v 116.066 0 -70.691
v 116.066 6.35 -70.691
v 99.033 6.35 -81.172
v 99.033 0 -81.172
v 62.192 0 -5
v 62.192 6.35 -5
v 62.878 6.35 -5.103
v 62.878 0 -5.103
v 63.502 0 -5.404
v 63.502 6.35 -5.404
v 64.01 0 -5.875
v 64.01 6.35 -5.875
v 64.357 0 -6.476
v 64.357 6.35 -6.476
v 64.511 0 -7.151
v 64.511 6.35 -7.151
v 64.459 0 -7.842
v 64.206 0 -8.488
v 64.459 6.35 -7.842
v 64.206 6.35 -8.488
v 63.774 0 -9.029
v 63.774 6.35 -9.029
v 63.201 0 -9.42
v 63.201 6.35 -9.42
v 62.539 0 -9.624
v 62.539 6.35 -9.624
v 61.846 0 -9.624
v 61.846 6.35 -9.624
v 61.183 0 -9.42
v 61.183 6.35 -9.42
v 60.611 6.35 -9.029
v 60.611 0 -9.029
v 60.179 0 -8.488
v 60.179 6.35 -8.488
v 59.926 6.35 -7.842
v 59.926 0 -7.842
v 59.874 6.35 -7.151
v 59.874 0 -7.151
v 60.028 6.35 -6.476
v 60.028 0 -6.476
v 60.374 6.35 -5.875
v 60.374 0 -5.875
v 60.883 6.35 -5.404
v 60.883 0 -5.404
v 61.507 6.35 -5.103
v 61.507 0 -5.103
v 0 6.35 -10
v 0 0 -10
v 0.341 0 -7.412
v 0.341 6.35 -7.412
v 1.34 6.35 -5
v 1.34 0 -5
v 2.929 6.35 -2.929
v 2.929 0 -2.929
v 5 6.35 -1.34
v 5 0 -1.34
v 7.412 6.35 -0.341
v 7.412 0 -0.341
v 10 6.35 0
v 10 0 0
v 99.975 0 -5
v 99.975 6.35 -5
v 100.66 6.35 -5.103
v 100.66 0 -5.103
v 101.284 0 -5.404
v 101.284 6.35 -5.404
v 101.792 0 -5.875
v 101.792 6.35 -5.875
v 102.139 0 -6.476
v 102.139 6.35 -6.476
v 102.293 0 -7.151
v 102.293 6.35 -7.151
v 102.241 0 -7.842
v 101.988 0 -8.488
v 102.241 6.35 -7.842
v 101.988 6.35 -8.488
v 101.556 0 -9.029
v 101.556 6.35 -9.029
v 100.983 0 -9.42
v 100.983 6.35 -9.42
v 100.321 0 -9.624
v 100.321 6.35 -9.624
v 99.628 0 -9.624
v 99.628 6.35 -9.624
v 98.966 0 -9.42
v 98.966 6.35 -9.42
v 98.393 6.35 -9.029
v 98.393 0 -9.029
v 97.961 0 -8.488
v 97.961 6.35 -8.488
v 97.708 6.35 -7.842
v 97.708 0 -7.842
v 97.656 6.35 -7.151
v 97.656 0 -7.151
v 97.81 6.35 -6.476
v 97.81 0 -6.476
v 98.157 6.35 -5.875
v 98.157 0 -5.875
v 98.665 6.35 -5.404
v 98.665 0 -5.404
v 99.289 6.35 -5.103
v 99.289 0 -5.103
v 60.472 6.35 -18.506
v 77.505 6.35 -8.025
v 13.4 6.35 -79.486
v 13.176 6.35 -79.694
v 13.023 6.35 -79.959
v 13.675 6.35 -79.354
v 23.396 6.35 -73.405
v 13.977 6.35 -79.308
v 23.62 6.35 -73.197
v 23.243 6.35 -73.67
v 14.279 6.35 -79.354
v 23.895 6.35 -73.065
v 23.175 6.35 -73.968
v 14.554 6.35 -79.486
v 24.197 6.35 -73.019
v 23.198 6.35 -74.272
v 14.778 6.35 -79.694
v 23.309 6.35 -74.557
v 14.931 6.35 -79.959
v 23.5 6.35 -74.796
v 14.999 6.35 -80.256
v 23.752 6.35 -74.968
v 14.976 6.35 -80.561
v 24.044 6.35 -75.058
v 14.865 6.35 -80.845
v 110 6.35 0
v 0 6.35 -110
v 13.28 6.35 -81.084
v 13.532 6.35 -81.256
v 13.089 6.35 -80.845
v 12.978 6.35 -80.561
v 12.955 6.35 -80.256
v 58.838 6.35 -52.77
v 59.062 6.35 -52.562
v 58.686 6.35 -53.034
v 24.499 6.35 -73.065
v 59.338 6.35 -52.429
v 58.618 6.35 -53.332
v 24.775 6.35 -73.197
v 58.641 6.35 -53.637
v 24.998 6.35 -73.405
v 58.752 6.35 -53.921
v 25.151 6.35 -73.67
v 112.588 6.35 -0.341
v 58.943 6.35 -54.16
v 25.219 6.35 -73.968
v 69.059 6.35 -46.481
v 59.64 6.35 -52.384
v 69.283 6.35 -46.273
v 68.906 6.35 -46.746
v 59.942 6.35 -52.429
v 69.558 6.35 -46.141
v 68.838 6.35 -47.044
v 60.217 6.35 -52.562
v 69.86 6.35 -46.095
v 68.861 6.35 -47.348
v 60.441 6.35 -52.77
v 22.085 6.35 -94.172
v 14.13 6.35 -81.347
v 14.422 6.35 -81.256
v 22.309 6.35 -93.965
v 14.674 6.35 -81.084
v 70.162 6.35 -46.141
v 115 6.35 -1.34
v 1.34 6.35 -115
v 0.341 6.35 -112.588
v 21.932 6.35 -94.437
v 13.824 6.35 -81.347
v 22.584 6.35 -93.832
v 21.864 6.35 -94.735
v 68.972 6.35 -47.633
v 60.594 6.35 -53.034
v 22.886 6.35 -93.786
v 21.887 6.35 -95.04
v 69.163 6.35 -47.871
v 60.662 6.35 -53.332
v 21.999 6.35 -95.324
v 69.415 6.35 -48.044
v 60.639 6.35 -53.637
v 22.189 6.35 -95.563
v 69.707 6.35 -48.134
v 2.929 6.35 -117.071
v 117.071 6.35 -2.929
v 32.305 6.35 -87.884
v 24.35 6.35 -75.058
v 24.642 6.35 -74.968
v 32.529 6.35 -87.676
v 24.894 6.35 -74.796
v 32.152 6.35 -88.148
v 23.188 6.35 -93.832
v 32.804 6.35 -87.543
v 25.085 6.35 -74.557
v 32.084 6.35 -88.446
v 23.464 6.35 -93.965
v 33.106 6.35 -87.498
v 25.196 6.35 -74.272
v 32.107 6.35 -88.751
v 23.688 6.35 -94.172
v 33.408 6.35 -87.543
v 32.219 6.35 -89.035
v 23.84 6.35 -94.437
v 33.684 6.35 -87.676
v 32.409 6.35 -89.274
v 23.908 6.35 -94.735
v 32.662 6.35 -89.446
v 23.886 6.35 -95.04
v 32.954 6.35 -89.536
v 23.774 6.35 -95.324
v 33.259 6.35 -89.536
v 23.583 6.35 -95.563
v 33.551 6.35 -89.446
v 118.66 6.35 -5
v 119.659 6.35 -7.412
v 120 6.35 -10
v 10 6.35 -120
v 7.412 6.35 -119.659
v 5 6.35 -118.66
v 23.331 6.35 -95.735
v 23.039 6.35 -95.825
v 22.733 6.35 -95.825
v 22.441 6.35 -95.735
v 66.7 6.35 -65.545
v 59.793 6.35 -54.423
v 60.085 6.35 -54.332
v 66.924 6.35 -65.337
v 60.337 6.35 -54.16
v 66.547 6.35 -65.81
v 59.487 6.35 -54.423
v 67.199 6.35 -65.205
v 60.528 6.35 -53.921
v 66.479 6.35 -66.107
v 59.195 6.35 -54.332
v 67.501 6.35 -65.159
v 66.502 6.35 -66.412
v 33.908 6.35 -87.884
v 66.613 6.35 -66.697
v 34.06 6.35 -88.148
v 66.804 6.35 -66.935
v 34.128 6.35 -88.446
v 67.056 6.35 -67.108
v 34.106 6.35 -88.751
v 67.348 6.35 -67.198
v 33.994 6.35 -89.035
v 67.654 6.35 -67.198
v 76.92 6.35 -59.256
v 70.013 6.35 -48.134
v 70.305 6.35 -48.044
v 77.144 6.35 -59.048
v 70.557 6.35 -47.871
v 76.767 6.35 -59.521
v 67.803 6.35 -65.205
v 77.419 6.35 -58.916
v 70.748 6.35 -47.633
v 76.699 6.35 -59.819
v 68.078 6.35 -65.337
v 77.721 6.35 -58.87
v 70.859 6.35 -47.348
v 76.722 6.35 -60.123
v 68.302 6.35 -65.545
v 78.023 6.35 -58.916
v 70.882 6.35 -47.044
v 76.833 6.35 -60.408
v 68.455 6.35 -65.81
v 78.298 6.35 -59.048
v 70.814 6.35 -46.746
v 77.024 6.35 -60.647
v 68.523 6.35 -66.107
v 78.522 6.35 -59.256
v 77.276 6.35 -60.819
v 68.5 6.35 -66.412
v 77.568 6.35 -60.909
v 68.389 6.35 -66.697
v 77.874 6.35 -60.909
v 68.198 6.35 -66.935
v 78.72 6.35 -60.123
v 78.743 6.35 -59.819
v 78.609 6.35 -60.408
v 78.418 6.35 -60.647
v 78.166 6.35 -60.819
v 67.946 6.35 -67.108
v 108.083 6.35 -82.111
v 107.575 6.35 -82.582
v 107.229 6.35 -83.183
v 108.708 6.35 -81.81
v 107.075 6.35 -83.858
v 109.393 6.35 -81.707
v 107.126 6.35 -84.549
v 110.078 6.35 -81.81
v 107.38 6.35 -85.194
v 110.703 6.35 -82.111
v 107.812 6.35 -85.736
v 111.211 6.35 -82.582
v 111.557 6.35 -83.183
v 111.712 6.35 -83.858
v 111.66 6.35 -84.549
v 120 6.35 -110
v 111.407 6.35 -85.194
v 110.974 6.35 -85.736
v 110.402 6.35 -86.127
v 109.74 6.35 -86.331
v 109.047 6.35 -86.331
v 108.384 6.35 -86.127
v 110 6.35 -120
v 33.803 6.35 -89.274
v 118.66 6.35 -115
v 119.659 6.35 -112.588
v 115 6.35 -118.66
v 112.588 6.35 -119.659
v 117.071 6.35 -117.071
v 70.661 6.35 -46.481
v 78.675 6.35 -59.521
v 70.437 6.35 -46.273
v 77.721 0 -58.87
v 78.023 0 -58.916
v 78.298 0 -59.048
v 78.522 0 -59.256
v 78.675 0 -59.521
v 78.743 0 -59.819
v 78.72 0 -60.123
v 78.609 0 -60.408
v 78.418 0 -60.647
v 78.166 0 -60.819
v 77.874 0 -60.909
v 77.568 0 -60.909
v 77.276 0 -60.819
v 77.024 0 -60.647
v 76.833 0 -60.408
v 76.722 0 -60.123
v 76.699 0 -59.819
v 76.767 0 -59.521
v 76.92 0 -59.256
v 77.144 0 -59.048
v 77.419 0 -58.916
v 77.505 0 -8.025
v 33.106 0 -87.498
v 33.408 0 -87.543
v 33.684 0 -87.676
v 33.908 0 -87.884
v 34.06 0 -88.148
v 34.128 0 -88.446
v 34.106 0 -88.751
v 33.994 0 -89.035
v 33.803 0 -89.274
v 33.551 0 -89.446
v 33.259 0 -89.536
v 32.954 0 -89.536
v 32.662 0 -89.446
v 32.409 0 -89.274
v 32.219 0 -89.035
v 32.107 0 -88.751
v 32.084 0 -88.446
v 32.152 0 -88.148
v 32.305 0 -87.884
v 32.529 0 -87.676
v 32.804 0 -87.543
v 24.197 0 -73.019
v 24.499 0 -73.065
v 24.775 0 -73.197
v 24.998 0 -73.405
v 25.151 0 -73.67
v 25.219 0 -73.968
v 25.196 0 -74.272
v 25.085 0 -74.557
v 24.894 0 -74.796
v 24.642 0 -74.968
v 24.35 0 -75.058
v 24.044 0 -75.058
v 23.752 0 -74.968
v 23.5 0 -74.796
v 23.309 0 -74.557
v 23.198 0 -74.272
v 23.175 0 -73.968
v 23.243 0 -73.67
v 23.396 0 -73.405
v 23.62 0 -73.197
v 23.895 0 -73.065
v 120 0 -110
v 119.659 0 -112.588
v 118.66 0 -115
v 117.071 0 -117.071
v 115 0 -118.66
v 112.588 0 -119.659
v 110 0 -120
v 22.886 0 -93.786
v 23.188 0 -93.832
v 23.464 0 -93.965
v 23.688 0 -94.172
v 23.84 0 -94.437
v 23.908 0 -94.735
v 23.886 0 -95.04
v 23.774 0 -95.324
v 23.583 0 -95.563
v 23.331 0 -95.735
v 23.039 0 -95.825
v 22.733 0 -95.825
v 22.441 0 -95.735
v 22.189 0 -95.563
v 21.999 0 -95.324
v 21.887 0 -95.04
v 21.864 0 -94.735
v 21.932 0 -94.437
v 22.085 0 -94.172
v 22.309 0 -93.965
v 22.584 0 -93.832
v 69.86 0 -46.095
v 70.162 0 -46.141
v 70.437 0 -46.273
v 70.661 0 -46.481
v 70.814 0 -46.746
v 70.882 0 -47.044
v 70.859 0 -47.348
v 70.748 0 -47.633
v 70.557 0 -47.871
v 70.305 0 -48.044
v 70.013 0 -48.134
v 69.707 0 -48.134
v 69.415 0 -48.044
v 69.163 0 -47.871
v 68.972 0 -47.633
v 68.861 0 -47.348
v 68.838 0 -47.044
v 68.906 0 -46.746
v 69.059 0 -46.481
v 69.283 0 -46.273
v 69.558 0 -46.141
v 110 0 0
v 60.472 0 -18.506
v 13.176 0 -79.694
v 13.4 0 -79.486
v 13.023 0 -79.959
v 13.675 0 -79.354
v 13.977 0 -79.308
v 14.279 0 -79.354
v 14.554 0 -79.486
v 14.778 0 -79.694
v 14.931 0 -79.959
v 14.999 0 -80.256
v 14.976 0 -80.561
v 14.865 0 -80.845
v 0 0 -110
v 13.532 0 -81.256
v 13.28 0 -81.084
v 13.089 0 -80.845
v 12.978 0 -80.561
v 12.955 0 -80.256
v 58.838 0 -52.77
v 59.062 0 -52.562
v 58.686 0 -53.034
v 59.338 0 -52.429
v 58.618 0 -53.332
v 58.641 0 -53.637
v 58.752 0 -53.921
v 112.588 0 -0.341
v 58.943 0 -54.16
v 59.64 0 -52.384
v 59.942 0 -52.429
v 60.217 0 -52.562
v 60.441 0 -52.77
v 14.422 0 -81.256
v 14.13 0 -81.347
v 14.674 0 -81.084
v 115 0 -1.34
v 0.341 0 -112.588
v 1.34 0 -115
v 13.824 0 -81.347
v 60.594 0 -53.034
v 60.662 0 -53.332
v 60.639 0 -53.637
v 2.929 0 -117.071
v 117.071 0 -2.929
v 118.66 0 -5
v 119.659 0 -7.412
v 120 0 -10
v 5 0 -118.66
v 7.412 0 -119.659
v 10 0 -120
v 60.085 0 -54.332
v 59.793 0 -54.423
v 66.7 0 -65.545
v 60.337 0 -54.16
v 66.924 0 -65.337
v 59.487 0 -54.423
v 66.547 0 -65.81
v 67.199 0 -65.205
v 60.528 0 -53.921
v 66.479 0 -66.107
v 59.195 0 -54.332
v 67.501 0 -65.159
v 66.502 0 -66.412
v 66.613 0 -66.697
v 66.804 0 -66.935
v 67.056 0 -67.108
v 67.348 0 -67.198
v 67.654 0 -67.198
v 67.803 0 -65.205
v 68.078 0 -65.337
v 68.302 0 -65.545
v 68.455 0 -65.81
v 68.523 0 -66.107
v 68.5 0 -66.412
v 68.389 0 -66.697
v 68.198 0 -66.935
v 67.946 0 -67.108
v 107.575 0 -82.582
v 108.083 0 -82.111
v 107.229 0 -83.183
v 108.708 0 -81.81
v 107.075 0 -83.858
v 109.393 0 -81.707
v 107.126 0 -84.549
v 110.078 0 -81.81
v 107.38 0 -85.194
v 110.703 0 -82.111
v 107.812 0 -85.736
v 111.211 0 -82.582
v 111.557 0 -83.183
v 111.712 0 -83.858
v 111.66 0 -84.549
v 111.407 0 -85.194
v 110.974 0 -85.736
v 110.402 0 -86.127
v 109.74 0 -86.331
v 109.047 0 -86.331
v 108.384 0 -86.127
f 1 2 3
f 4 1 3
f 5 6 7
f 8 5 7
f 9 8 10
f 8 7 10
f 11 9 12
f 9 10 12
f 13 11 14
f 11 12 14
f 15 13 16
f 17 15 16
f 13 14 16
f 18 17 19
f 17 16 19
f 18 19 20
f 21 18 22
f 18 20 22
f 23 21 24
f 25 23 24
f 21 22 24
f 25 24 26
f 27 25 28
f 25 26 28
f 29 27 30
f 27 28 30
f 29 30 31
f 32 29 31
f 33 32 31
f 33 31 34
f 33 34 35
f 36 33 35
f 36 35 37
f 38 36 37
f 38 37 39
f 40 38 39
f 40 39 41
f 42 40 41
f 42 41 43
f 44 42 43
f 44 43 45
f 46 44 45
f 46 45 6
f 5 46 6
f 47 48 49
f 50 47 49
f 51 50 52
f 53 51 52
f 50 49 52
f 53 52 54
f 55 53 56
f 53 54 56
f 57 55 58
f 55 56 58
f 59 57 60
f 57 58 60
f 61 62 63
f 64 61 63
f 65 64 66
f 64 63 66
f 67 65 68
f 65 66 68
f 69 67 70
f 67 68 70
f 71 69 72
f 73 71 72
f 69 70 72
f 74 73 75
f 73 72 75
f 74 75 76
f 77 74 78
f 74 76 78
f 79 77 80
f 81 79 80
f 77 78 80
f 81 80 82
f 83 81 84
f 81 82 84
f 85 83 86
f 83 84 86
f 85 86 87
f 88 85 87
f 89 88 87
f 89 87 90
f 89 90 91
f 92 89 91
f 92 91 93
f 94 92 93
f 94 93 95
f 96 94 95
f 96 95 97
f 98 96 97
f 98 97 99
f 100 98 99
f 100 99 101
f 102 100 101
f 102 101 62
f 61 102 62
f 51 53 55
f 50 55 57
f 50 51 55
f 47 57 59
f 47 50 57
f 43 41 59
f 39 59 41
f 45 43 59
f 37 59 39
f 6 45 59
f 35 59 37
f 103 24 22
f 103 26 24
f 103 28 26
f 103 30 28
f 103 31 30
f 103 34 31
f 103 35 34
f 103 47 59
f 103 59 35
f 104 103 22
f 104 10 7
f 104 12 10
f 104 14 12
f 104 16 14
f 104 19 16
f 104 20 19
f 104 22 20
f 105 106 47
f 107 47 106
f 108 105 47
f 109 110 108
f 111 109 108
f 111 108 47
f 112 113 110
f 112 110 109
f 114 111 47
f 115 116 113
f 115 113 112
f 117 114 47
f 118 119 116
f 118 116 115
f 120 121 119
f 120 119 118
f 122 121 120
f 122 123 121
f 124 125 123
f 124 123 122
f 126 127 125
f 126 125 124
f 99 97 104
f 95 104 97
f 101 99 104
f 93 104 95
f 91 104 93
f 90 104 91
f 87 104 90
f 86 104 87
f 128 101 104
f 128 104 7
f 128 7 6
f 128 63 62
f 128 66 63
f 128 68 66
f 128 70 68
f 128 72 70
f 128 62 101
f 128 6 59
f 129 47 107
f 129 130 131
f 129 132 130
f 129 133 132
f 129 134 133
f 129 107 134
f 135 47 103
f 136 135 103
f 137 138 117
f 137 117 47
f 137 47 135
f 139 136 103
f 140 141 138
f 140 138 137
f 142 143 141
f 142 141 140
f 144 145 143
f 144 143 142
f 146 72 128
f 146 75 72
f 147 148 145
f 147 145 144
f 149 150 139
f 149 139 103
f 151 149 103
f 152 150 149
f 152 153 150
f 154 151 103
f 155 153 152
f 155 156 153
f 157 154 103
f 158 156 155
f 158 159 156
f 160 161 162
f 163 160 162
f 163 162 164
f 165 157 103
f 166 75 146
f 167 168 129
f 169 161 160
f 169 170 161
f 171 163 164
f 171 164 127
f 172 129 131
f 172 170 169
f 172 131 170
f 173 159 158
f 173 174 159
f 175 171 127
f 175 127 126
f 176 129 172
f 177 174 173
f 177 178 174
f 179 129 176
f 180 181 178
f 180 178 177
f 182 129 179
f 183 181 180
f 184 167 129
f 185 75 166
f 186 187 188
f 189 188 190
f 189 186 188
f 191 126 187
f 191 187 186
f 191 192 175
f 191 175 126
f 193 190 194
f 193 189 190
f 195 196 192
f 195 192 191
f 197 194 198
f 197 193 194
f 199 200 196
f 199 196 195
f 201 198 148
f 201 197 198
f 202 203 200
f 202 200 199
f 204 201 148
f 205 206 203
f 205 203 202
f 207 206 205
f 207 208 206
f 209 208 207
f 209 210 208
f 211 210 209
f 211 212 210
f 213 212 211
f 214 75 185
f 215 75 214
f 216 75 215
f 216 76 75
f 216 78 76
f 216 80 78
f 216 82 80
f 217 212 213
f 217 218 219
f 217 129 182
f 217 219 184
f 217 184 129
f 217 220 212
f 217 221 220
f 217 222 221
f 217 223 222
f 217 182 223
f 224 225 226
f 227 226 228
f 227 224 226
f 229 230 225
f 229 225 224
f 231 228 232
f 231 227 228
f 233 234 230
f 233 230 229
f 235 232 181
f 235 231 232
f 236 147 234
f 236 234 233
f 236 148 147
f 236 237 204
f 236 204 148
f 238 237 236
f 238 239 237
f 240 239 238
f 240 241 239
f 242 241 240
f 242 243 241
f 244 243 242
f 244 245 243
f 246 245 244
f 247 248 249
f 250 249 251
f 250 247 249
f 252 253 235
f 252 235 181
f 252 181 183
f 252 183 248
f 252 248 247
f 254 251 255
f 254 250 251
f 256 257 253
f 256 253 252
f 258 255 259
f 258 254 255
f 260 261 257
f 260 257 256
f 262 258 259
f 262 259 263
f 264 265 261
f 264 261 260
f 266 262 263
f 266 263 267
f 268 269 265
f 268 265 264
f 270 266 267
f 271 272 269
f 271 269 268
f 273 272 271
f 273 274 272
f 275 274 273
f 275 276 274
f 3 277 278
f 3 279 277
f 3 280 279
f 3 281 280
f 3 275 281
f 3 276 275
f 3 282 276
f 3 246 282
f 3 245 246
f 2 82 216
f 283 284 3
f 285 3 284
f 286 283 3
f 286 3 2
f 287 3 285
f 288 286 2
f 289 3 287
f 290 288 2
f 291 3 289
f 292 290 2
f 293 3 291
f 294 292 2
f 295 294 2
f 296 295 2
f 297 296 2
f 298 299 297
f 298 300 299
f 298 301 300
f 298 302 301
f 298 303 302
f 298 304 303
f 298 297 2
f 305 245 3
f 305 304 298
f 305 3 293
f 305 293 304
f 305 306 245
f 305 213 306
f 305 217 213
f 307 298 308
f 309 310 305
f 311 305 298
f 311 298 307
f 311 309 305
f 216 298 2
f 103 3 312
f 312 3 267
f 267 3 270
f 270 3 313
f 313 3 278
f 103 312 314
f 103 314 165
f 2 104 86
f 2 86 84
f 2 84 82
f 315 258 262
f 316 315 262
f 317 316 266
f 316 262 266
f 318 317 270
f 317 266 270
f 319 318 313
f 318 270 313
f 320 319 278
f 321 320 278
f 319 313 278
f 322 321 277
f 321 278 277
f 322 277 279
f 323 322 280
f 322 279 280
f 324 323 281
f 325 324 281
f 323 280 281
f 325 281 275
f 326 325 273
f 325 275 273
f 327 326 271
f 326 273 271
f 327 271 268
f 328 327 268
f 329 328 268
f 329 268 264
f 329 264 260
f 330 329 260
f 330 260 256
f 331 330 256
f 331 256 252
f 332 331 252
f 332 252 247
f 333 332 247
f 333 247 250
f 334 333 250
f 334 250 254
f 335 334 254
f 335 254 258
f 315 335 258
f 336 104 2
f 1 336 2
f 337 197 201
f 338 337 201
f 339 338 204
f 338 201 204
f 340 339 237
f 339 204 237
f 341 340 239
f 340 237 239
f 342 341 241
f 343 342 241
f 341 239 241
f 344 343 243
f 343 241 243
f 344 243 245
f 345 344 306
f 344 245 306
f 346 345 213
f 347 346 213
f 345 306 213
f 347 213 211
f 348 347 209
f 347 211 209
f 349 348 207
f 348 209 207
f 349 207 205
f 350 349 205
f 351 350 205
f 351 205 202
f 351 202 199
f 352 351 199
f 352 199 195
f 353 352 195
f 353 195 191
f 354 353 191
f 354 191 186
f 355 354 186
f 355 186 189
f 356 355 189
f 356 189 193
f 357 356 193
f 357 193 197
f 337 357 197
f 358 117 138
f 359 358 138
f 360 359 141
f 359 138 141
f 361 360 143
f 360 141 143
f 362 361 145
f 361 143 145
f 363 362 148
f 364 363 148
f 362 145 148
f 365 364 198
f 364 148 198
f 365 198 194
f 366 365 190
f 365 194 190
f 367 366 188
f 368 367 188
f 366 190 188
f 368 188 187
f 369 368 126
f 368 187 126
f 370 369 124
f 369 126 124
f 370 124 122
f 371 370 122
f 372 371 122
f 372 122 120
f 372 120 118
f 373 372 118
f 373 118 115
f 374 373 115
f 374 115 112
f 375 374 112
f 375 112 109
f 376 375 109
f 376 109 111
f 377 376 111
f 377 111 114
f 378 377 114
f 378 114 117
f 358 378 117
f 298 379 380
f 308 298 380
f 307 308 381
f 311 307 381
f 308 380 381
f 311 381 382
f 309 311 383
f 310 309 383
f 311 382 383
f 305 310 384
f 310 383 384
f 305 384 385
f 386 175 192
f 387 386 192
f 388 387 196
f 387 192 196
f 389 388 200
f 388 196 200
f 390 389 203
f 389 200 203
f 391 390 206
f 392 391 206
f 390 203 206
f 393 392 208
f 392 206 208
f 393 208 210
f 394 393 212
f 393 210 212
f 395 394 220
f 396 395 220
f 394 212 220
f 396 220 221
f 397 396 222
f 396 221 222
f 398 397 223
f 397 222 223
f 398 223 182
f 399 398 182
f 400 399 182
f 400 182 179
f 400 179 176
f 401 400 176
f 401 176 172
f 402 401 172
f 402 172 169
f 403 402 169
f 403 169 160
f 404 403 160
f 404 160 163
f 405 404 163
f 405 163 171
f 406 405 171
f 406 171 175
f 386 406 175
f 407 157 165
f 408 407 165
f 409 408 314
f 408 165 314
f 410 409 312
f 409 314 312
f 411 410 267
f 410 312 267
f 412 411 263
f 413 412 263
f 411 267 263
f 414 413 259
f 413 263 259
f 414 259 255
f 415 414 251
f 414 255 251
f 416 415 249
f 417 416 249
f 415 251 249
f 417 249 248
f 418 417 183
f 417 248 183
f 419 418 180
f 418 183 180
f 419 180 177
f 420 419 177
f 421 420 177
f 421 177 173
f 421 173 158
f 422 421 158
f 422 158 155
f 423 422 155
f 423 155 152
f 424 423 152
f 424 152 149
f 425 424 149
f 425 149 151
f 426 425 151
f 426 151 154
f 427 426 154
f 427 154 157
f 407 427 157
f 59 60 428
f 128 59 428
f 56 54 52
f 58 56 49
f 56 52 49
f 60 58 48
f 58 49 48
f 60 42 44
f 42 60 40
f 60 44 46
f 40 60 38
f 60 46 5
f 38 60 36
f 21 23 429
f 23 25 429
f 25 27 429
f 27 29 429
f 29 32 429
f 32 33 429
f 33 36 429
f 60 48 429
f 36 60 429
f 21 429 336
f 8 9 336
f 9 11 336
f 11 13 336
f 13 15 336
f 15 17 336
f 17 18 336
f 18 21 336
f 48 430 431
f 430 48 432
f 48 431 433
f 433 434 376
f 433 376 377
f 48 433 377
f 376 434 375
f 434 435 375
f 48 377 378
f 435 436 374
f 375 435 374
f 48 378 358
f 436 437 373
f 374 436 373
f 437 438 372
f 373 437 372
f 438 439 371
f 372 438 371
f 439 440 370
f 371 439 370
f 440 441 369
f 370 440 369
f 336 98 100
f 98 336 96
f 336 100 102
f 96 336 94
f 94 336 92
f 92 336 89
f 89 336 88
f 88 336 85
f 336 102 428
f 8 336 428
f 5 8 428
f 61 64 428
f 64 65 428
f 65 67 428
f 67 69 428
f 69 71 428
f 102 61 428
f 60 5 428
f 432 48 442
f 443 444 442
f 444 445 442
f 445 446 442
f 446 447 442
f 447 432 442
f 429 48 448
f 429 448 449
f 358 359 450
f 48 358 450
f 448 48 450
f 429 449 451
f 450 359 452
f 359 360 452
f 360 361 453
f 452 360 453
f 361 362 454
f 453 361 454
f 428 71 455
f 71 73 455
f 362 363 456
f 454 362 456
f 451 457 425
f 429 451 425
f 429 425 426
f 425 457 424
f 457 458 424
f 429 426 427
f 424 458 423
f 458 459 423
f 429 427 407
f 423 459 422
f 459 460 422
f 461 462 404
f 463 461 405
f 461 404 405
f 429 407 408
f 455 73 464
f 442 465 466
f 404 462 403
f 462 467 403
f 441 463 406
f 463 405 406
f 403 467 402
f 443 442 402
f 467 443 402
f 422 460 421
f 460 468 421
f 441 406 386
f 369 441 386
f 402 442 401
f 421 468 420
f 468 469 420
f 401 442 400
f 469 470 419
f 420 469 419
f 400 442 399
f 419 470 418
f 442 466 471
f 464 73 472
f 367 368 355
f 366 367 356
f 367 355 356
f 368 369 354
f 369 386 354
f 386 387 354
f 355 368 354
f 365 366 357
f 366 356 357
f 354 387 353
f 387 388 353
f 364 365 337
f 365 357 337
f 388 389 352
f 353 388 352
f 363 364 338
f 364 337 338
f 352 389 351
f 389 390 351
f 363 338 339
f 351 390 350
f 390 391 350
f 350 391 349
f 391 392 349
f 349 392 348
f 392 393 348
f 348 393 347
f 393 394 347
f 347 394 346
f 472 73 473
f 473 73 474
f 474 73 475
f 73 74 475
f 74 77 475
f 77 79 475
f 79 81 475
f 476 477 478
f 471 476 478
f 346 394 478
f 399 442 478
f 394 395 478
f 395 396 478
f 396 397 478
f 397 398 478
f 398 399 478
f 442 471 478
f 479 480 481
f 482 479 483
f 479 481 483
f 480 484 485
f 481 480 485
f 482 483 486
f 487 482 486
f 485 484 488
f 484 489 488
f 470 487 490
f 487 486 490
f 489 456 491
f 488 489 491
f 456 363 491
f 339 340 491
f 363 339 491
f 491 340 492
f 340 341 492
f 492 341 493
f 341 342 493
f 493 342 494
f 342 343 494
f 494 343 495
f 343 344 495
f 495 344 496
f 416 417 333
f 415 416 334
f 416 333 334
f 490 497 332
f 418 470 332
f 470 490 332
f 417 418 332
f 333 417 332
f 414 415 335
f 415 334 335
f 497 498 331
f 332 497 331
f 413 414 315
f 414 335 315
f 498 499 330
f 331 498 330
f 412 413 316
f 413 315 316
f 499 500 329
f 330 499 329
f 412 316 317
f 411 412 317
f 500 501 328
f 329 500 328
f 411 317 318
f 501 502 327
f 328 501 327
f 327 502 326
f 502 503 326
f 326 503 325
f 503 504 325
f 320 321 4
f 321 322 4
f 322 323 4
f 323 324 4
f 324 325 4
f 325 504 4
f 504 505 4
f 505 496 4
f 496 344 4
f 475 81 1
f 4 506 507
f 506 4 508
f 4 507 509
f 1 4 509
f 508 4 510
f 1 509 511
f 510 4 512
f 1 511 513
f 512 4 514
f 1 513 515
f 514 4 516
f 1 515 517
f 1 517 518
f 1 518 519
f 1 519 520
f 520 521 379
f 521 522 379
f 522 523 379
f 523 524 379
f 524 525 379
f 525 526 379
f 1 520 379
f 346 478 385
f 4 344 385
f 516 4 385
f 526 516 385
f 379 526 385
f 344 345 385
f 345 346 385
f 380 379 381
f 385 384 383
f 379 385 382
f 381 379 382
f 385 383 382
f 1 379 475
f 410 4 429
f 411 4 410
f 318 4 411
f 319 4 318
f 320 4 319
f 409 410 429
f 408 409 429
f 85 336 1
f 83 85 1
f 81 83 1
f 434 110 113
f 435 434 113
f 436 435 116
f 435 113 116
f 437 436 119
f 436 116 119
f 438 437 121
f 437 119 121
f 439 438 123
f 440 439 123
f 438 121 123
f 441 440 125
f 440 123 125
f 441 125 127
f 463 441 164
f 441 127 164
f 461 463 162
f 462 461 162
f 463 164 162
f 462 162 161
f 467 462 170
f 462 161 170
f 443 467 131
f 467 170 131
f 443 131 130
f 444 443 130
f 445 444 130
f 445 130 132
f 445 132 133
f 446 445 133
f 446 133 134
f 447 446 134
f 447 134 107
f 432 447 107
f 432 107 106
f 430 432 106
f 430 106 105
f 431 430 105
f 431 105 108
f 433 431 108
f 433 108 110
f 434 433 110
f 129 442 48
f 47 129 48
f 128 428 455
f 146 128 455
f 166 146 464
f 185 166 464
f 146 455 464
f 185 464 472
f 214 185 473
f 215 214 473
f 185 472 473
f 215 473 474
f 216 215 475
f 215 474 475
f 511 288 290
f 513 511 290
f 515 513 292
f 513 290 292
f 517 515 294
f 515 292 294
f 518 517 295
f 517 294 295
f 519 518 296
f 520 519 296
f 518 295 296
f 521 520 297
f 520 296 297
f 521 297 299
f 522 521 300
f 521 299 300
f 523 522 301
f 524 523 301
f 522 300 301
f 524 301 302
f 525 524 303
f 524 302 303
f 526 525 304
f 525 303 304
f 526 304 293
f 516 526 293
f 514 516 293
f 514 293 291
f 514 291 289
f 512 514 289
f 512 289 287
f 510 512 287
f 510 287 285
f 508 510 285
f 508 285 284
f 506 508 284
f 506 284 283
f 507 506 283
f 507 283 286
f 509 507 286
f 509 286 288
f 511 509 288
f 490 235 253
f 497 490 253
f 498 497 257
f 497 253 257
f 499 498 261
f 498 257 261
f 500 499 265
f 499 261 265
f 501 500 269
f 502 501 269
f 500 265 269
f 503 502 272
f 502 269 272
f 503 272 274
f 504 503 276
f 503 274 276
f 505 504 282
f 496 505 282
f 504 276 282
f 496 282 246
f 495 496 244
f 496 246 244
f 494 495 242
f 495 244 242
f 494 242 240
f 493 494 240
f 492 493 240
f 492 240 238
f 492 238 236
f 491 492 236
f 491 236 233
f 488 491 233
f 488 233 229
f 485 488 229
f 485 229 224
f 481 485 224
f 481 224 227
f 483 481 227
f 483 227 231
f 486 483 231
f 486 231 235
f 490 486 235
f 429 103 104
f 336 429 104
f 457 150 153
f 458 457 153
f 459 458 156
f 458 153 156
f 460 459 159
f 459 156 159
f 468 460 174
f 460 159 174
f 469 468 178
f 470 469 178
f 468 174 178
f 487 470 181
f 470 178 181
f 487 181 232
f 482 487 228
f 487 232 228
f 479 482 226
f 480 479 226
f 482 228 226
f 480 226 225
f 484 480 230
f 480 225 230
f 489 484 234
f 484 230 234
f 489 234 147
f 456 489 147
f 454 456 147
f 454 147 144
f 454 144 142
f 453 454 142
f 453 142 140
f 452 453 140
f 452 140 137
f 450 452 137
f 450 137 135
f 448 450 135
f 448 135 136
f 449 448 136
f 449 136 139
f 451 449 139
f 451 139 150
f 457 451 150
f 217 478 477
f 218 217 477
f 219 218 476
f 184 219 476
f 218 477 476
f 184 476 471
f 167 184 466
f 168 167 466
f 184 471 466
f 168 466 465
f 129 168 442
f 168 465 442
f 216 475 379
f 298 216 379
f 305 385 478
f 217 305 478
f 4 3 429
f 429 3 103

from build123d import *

# Parameters (mm, degrees)
BOSS_EXTRUDE1_DEPTH = 6.35
SKETCH2_R           = 2.325
CUT_EXTRUDE1_DEPTH  = 170.824387236
SKETCH5_R           = 1.025
CUT_EXTRUDE2_DEPTH  = 170.824387236


with BuildPart() as part:
    # Sketch1 → Boss-Extrude1 (new body)
    with BuildSketch(Plane(origin=(0, 0, 0), x_dir=(1, 0, 0), z_dir=(0, 1, 0))):
        with BuildLine():
            Line((10, 0), (110, 0))
            ThreePointArc((110, 0), (117.071067812, 2.928932188), (120, 10))
            Line((120, 10), (120, 110))
            ThreePointArc((120, 110), (117.071067812, 117.071067812), (110, 120))
            Line((110, 120), (10, 120))
            ThreePointArc((10, 120), (2.928932188, 117.071067812), (0, 110))
            Line((0, 110), (0, 10))
            ThreePointArc((0, 10), (2.928932188, 2.928932188), (10, 0))
        make_face()
    extrude(amount=BOSS_EXTRUDE1_DEPTH)

    # Sketch2 → Cut-Extrude1 (cut, through all)
    with BuildSketch(Plane(origin=(0, 6.35, 0), x_dir=(1, 0, 0), z_dir=(0, 1, 0))):
        with Locations(Location((62.192235265, 7.325, 0), (0, 0, 270))):
            Circle(SKETCH2_R)
        with Locations(Location((99.974668934, 7.325, 0), (0, 0, 270))):
            Circle(SKETCH2_R)
        with Locations(Location((109.393095317, 84.031927265, 0), (0, 0, 270))):
            Circle(SKETCH2_R)
        Polygon((60.471691743, 18.506055104), (77.505195351, 8.02465468), (116.066267511, 70.690914453), (99.032763904, 81.172314877), align=None)
    extrude(amount=-CUT_EXTRUDE1_DEPTH, mode=Mode.SUBTRACT)

    # Sketch5 → Cut-Extrude2 (cut, through all)
    with BuildSketch(Plane(origin=(0, 6.35, 0), x_dir=(1, 0, 0), z_dir=(0, 1, 0))):
        with Locations(Location((69.859976402, 47.120111286, 0), (0, 0, 270))):
            Circle(SKETCH5_R)
        with Locations(Location((59.639874237, 53.408951541, 0), (0, 0, 270))):
            Circle(SKETCH5_R)
        with Locations(Location((77.72102672, 59.895238992, 0), (0, 0, 270))):
            Circle(SKETCH5_R)
        with Locations(Location((67.500924556, 66.184079246, 0), (0, 0, 270))):
            Circle(SKETCH5_R)
        with Locations(Location((13.977019656, 80.332987484, 0), (0, 0, 270))):
            Circle(SKETCH5_R)
        with Locations(Location((24.197121821, 74.04414723, 0), (0, 0, 270))):
            Circle(SKETCH5_R)
        with Locations(Location((33.106312181, 88.522625296, 0), (0, 0, 270))):
            Circle(SKETCH5_R)
        with Locations(Location((22.886210017, 94.811465551, 0), (0, 0, 270))):
            Circle(SKETCH5_R)
    extrude(amount=-CUT_EXTRUDE2_DEPTH, mode=Mode.SUBTRACT)


solid = part.part
